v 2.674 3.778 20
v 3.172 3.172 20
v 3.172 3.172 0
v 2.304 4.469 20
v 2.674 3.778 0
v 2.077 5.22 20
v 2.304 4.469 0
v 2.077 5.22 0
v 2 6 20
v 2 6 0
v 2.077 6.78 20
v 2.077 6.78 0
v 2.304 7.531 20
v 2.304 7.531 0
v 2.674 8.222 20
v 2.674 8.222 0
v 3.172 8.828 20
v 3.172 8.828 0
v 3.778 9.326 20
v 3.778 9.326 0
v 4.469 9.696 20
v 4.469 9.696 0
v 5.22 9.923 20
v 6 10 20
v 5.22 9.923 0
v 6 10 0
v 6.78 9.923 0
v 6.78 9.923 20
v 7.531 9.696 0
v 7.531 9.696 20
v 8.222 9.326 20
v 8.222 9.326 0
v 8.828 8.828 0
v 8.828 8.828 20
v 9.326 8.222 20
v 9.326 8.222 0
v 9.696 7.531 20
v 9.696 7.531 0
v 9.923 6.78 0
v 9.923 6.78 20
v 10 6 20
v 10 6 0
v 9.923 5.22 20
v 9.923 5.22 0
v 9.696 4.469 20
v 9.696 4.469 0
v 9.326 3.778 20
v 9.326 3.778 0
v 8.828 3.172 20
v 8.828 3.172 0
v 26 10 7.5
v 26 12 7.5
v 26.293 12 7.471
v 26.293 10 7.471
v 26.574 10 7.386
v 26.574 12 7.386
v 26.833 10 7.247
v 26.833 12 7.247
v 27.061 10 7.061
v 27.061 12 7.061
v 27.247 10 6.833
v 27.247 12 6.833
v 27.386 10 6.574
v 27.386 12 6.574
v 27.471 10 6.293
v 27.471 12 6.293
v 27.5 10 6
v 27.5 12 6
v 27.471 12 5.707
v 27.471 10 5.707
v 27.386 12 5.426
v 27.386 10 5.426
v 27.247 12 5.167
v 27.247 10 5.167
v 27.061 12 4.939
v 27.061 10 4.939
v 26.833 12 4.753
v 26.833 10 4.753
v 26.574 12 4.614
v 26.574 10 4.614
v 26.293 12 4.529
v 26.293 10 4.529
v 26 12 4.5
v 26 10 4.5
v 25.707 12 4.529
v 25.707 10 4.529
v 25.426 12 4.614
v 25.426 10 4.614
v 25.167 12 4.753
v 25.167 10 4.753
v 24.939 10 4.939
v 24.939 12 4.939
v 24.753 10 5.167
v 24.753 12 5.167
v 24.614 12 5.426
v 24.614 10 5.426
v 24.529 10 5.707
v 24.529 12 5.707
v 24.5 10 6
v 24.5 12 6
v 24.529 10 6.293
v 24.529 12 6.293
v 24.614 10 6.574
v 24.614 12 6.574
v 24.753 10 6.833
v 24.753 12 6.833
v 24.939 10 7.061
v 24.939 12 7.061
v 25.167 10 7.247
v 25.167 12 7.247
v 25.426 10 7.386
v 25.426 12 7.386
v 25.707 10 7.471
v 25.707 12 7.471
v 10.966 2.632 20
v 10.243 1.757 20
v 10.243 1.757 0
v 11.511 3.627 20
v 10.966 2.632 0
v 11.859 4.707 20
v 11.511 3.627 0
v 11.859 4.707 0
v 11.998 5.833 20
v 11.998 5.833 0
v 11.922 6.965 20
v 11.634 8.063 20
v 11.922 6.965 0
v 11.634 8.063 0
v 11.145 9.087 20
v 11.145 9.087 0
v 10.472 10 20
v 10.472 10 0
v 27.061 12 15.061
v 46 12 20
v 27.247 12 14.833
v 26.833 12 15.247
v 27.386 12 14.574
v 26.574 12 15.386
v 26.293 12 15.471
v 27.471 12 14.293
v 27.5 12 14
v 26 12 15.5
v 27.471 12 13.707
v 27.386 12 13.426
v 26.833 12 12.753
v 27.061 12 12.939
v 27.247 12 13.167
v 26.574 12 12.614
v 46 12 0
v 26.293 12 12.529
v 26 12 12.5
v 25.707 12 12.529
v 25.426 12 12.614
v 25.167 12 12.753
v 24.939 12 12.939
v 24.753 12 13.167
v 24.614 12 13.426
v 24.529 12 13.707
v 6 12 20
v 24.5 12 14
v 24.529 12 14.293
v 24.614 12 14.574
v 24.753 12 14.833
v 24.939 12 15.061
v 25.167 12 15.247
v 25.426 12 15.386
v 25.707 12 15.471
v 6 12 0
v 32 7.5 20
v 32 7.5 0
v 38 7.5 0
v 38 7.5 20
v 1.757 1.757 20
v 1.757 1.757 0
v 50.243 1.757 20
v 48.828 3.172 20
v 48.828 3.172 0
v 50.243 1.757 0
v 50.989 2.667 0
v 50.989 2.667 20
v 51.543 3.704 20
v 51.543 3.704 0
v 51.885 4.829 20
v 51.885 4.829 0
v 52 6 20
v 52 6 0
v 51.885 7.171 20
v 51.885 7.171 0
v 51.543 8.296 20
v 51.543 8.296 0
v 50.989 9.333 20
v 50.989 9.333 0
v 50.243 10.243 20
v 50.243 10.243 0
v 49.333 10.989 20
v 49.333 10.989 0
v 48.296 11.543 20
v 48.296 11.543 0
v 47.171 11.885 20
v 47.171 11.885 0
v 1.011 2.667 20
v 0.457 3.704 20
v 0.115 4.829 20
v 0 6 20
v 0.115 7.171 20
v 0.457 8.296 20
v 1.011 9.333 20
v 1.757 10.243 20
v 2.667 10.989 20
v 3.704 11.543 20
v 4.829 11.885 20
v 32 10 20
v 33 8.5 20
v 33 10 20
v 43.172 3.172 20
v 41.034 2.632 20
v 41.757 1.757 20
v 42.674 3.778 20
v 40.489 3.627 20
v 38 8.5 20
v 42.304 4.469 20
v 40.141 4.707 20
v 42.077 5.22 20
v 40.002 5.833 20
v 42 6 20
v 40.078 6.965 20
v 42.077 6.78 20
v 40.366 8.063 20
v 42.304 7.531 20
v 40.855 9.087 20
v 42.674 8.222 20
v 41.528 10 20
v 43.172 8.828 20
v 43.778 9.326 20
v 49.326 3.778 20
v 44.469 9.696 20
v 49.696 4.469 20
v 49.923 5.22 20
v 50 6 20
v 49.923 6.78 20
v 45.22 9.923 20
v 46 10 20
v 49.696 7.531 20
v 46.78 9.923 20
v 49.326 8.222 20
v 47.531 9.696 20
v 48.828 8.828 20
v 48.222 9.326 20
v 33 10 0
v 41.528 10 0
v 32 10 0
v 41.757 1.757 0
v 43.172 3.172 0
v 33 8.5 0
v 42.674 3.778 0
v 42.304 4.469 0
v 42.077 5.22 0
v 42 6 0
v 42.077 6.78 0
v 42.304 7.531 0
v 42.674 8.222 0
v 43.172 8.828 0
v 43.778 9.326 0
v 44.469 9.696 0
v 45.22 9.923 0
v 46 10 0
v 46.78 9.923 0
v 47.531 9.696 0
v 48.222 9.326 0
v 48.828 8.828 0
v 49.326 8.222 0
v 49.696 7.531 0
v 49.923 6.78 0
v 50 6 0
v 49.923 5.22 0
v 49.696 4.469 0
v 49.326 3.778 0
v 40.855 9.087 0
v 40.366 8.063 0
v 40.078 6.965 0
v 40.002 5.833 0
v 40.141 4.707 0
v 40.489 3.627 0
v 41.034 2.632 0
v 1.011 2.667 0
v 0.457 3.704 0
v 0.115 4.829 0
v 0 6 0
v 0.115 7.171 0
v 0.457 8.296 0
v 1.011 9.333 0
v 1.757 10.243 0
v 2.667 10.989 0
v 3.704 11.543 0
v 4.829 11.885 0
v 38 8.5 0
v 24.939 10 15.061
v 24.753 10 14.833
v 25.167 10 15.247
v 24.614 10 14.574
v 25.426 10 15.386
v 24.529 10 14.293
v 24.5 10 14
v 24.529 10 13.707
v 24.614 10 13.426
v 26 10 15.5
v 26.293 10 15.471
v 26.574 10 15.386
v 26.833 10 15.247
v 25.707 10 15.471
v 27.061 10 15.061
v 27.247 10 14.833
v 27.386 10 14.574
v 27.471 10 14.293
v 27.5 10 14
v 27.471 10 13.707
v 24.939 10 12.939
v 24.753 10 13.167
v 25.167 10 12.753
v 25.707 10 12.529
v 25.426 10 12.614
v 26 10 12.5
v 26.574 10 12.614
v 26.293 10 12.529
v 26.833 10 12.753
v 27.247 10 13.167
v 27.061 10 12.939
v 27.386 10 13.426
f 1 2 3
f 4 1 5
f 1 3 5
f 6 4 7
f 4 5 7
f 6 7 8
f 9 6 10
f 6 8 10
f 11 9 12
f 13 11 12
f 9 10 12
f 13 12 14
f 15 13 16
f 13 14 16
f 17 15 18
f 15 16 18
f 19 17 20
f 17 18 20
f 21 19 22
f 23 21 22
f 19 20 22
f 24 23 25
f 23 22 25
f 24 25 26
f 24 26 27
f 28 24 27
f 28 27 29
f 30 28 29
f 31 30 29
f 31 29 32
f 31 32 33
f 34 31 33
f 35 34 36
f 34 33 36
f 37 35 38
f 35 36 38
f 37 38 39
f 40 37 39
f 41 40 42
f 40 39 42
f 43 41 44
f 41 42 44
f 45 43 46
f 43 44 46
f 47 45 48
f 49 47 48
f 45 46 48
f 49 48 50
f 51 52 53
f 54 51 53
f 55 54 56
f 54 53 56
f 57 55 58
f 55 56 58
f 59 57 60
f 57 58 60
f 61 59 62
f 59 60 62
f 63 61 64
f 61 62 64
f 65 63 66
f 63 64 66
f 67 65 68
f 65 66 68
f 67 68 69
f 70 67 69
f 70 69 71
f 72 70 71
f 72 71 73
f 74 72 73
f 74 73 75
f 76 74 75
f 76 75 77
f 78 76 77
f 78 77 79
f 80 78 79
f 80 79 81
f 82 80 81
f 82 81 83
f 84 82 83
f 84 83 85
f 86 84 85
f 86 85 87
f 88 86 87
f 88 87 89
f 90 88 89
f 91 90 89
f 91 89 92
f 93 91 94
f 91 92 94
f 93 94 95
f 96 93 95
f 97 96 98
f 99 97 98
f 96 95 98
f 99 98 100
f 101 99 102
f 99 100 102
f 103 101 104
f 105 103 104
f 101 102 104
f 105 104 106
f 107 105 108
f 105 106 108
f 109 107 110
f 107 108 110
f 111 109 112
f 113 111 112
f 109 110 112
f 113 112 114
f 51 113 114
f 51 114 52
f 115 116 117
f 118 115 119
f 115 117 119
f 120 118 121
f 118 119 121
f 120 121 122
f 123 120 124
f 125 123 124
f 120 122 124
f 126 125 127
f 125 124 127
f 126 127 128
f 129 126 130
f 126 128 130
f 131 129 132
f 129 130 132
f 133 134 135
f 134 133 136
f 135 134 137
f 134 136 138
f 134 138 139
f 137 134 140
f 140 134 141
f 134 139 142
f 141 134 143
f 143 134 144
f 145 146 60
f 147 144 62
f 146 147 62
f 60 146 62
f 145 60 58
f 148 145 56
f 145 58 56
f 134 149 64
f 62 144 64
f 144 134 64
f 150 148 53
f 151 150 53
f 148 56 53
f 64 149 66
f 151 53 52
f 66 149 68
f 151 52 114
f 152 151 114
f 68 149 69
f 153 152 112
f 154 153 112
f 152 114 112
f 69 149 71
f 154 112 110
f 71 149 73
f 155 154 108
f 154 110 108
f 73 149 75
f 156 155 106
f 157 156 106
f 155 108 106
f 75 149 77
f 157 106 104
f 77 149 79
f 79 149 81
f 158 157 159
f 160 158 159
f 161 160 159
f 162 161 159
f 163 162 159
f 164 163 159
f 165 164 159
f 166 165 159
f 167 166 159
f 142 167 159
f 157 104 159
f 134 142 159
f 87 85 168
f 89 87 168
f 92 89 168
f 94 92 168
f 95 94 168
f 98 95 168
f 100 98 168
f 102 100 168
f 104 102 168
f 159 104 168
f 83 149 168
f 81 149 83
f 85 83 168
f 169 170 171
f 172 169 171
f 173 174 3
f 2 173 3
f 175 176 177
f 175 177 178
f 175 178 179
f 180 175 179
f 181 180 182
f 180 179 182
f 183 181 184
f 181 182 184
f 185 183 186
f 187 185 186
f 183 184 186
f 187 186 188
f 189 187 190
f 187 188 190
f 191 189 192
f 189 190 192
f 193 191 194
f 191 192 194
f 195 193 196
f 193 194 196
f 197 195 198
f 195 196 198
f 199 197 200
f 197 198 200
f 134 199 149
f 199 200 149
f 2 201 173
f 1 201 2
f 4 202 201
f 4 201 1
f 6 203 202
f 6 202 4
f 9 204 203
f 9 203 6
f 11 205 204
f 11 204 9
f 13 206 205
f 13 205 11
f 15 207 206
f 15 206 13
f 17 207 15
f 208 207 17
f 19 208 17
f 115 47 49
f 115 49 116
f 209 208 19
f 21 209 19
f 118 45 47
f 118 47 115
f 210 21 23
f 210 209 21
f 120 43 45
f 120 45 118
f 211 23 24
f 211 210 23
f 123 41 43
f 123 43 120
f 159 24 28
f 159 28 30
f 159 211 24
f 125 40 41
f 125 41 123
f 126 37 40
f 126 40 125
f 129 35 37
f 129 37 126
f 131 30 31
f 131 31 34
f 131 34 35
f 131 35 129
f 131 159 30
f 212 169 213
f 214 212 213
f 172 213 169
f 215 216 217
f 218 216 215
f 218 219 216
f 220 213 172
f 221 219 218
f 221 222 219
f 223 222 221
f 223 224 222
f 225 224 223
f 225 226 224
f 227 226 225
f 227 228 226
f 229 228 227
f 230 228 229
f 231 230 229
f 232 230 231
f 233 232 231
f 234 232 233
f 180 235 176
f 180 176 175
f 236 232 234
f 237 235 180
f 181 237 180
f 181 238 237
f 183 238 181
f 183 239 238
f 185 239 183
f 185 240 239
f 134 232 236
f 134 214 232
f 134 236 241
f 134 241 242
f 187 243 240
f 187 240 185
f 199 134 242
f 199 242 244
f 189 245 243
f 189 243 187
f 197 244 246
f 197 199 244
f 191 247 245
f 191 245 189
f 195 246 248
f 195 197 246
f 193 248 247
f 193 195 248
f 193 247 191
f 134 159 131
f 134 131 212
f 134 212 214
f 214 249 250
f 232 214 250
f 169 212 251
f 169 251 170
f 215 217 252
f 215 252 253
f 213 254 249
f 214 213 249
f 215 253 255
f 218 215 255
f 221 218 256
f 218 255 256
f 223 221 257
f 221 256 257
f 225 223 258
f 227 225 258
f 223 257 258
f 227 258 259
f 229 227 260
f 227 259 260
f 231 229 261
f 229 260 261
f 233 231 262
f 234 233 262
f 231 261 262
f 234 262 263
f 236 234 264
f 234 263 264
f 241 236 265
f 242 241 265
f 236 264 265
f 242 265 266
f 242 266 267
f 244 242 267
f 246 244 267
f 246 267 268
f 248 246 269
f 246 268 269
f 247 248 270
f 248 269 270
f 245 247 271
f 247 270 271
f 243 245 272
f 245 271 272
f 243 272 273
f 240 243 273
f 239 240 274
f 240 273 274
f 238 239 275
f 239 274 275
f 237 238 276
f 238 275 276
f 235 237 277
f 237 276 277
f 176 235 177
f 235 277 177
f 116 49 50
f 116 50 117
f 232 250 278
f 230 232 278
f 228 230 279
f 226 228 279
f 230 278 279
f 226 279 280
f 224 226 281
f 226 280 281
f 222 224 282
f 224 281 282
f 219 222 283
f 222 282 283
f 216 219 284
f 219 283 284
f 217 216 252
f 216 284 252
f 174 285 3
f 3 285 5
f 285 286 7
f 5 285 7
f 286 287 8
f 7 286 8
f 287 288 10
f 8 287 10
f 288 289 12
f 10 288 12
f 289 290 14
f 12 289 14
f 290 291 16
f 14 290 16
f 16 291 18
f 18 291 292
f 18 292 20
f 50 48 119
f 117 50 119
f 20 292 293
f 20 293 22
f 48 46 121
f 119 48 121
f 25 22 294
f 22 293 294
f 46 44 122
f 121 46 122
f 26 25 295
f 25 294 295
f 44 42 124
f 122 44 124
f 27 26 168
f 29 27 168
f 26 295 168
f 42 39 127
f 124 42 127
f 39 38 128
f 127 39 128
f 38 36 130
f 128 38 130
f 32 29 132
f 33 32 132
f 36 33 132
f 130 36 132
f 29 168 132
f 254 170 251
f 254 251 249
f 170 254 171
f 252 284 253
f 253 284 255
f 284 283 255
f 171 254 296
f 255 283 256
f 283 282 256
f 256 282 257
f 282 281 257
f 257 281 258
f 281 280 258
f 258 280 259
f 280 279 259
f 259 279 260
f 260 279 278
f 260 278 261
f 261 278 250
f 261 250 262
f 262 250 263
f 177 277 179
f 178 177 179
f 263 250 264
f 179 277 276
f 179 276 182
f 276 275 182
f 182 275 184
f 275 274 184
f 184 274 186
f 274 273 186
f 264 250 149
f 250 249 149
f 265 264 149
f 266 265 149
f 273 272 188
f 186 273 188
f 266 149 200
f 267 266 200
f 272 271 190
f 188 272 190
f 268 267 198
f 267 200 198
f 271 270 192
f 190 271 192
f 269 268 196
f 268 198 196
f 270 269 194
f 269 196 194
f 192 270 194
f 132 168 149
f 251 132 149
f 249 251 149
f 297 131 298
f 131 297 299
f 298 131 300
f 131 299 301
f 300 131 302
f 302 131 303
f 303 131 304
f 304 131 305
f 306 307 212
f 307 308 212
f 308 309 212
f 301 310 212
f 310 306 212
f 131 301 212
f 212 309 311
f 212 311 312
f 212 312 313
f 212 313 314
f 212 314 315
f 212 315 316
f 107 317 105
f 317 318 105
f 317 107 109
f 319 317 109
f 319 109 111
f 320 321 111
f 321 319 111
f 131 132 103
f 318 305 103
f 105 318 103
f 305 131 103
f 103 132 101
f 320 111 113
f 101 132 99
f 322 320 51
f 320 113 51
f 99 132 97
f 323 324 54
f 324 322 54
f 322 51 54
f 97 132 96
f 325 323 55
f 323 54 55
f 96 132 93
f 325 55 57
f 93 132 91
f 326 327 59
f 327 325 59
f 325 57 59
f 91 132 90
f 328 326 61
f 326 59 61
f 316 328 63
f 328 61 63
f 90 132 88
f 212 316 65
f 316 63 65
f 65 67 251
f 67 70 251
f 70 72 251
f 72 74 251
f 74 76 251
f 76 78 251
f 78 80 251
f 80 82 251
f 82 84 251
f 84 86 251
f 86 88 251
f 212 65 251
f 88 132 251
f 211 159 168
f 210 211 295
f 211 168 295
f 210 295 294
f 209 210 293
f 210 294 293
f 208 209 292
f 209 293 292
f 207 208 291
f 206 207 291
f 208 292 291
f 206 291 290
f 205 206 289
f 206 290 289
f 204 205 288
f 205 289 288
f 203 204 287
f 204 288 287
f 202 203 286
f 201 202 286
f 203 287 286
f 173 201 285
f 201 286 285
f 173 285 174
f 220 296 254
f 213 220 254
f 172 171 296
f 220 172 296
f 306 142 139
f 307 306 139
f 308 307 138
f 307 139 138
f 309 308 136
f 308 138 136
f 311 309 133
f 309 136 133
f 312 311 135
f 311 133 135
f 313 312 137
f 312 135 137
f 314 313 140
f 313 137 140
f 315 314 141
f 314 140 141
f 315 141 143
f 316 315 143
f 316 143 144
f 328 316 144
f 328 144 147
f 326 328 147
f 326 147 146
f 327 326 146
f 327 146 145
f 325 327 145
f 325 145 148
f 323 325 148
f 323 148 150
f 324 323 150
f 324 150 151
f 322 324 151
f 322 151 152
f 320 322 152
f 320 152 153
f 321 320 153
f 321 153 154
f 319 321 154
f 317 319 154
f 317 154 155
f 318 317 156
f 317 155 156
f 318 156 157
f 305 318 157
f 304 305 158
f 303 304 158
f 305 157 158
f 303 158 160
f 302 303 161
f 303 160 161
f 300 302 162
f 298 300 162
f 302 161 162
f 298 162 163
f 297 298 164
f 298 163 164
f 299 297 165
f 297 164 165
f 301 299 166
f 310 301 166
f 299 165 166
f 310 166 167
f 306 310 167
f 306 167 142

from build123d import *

# Parameters (mm, degrees)
BOSS_EXTRU_1_DEPTH      = 20
ESQUISSE2_R             = 1.5
ENL_V_MAT_EXTRU_1_DEPTH = 20


with BuildPart() as part:
    # Esquisse1 → Boss.-Extru.1 (new body)
    with BuildSketch(Plane.XY):
        with BuildLine():
            Line((46, 12), (6, 12))
            ThreePointArc((6, 12), (0.456722805, 8.296100594), (1.757359313, 1.757359313))
            Line((1.757359313, 1.757359313), (3.171572875, 3.171572875))
            ThreePointArc((3.171572875, 3.171572875), (6, 10), (8.828427125, 3.171572875))
            Line((8.828427125, 3.171572875), (10.242640687, 1.757359313))
            ThreePointArc((10.242640687, 1.757359313), (11.997675746, 5.833010044), (10.472135955, 10))
            Line((10.472135955, 10), (32, 10))
            Line((32, 10), (32, 7.5))
            Line((32, 7.5), (38, 7.5))
            Line((38, 7.5), (38, 8.5))
            Line((38, 8.5), (33, 8.5))
            Line((33, 8.5), (33, 10))
            Line((33, 10), (41.527864045, 10))
            ThreePointArc((41.527864045, 10), (40.002324254, 5.833010044), (41.757359313, 1.757359313))
            Line((41.757359313, 1.757359313), (43.171572875, 3.171572875))
            ThreePointArc((43.171572875, 3.171572875), (46, 10), (48.828427125, 3.171572875))
            Line((48.828427125, 3.171572875), (50.242640687, 1.757359313))
            ThreePointArc((50.242640687, 1.757359313), (51.543277195, 8.296100594), (46, 12))
        make_face()
    extrude(amount=BOSS_EXTRU_1_DEPTH)

    # Esquisse2 → Enlèv. mat.-Extru.1 (cut)
    with BuildSketch(Plane(origin=(0, 12, 0), x_dir=(1, 0, 0), z_dir=(0, 1, 0))):
        with Locations(Location((26, -6, 0), (0, 0, 270))):
            Circle(ESQUISSE2_R)
        with Locations(Location((26, -14, 0), (0, 0, 270))):
            Circle(ESQUISSE2_R)
    extrude(amount=-ENL_V_MAT_EXTRU_1_DEPTH, mode=Mode.SUBTRACT)


solid = part.part
